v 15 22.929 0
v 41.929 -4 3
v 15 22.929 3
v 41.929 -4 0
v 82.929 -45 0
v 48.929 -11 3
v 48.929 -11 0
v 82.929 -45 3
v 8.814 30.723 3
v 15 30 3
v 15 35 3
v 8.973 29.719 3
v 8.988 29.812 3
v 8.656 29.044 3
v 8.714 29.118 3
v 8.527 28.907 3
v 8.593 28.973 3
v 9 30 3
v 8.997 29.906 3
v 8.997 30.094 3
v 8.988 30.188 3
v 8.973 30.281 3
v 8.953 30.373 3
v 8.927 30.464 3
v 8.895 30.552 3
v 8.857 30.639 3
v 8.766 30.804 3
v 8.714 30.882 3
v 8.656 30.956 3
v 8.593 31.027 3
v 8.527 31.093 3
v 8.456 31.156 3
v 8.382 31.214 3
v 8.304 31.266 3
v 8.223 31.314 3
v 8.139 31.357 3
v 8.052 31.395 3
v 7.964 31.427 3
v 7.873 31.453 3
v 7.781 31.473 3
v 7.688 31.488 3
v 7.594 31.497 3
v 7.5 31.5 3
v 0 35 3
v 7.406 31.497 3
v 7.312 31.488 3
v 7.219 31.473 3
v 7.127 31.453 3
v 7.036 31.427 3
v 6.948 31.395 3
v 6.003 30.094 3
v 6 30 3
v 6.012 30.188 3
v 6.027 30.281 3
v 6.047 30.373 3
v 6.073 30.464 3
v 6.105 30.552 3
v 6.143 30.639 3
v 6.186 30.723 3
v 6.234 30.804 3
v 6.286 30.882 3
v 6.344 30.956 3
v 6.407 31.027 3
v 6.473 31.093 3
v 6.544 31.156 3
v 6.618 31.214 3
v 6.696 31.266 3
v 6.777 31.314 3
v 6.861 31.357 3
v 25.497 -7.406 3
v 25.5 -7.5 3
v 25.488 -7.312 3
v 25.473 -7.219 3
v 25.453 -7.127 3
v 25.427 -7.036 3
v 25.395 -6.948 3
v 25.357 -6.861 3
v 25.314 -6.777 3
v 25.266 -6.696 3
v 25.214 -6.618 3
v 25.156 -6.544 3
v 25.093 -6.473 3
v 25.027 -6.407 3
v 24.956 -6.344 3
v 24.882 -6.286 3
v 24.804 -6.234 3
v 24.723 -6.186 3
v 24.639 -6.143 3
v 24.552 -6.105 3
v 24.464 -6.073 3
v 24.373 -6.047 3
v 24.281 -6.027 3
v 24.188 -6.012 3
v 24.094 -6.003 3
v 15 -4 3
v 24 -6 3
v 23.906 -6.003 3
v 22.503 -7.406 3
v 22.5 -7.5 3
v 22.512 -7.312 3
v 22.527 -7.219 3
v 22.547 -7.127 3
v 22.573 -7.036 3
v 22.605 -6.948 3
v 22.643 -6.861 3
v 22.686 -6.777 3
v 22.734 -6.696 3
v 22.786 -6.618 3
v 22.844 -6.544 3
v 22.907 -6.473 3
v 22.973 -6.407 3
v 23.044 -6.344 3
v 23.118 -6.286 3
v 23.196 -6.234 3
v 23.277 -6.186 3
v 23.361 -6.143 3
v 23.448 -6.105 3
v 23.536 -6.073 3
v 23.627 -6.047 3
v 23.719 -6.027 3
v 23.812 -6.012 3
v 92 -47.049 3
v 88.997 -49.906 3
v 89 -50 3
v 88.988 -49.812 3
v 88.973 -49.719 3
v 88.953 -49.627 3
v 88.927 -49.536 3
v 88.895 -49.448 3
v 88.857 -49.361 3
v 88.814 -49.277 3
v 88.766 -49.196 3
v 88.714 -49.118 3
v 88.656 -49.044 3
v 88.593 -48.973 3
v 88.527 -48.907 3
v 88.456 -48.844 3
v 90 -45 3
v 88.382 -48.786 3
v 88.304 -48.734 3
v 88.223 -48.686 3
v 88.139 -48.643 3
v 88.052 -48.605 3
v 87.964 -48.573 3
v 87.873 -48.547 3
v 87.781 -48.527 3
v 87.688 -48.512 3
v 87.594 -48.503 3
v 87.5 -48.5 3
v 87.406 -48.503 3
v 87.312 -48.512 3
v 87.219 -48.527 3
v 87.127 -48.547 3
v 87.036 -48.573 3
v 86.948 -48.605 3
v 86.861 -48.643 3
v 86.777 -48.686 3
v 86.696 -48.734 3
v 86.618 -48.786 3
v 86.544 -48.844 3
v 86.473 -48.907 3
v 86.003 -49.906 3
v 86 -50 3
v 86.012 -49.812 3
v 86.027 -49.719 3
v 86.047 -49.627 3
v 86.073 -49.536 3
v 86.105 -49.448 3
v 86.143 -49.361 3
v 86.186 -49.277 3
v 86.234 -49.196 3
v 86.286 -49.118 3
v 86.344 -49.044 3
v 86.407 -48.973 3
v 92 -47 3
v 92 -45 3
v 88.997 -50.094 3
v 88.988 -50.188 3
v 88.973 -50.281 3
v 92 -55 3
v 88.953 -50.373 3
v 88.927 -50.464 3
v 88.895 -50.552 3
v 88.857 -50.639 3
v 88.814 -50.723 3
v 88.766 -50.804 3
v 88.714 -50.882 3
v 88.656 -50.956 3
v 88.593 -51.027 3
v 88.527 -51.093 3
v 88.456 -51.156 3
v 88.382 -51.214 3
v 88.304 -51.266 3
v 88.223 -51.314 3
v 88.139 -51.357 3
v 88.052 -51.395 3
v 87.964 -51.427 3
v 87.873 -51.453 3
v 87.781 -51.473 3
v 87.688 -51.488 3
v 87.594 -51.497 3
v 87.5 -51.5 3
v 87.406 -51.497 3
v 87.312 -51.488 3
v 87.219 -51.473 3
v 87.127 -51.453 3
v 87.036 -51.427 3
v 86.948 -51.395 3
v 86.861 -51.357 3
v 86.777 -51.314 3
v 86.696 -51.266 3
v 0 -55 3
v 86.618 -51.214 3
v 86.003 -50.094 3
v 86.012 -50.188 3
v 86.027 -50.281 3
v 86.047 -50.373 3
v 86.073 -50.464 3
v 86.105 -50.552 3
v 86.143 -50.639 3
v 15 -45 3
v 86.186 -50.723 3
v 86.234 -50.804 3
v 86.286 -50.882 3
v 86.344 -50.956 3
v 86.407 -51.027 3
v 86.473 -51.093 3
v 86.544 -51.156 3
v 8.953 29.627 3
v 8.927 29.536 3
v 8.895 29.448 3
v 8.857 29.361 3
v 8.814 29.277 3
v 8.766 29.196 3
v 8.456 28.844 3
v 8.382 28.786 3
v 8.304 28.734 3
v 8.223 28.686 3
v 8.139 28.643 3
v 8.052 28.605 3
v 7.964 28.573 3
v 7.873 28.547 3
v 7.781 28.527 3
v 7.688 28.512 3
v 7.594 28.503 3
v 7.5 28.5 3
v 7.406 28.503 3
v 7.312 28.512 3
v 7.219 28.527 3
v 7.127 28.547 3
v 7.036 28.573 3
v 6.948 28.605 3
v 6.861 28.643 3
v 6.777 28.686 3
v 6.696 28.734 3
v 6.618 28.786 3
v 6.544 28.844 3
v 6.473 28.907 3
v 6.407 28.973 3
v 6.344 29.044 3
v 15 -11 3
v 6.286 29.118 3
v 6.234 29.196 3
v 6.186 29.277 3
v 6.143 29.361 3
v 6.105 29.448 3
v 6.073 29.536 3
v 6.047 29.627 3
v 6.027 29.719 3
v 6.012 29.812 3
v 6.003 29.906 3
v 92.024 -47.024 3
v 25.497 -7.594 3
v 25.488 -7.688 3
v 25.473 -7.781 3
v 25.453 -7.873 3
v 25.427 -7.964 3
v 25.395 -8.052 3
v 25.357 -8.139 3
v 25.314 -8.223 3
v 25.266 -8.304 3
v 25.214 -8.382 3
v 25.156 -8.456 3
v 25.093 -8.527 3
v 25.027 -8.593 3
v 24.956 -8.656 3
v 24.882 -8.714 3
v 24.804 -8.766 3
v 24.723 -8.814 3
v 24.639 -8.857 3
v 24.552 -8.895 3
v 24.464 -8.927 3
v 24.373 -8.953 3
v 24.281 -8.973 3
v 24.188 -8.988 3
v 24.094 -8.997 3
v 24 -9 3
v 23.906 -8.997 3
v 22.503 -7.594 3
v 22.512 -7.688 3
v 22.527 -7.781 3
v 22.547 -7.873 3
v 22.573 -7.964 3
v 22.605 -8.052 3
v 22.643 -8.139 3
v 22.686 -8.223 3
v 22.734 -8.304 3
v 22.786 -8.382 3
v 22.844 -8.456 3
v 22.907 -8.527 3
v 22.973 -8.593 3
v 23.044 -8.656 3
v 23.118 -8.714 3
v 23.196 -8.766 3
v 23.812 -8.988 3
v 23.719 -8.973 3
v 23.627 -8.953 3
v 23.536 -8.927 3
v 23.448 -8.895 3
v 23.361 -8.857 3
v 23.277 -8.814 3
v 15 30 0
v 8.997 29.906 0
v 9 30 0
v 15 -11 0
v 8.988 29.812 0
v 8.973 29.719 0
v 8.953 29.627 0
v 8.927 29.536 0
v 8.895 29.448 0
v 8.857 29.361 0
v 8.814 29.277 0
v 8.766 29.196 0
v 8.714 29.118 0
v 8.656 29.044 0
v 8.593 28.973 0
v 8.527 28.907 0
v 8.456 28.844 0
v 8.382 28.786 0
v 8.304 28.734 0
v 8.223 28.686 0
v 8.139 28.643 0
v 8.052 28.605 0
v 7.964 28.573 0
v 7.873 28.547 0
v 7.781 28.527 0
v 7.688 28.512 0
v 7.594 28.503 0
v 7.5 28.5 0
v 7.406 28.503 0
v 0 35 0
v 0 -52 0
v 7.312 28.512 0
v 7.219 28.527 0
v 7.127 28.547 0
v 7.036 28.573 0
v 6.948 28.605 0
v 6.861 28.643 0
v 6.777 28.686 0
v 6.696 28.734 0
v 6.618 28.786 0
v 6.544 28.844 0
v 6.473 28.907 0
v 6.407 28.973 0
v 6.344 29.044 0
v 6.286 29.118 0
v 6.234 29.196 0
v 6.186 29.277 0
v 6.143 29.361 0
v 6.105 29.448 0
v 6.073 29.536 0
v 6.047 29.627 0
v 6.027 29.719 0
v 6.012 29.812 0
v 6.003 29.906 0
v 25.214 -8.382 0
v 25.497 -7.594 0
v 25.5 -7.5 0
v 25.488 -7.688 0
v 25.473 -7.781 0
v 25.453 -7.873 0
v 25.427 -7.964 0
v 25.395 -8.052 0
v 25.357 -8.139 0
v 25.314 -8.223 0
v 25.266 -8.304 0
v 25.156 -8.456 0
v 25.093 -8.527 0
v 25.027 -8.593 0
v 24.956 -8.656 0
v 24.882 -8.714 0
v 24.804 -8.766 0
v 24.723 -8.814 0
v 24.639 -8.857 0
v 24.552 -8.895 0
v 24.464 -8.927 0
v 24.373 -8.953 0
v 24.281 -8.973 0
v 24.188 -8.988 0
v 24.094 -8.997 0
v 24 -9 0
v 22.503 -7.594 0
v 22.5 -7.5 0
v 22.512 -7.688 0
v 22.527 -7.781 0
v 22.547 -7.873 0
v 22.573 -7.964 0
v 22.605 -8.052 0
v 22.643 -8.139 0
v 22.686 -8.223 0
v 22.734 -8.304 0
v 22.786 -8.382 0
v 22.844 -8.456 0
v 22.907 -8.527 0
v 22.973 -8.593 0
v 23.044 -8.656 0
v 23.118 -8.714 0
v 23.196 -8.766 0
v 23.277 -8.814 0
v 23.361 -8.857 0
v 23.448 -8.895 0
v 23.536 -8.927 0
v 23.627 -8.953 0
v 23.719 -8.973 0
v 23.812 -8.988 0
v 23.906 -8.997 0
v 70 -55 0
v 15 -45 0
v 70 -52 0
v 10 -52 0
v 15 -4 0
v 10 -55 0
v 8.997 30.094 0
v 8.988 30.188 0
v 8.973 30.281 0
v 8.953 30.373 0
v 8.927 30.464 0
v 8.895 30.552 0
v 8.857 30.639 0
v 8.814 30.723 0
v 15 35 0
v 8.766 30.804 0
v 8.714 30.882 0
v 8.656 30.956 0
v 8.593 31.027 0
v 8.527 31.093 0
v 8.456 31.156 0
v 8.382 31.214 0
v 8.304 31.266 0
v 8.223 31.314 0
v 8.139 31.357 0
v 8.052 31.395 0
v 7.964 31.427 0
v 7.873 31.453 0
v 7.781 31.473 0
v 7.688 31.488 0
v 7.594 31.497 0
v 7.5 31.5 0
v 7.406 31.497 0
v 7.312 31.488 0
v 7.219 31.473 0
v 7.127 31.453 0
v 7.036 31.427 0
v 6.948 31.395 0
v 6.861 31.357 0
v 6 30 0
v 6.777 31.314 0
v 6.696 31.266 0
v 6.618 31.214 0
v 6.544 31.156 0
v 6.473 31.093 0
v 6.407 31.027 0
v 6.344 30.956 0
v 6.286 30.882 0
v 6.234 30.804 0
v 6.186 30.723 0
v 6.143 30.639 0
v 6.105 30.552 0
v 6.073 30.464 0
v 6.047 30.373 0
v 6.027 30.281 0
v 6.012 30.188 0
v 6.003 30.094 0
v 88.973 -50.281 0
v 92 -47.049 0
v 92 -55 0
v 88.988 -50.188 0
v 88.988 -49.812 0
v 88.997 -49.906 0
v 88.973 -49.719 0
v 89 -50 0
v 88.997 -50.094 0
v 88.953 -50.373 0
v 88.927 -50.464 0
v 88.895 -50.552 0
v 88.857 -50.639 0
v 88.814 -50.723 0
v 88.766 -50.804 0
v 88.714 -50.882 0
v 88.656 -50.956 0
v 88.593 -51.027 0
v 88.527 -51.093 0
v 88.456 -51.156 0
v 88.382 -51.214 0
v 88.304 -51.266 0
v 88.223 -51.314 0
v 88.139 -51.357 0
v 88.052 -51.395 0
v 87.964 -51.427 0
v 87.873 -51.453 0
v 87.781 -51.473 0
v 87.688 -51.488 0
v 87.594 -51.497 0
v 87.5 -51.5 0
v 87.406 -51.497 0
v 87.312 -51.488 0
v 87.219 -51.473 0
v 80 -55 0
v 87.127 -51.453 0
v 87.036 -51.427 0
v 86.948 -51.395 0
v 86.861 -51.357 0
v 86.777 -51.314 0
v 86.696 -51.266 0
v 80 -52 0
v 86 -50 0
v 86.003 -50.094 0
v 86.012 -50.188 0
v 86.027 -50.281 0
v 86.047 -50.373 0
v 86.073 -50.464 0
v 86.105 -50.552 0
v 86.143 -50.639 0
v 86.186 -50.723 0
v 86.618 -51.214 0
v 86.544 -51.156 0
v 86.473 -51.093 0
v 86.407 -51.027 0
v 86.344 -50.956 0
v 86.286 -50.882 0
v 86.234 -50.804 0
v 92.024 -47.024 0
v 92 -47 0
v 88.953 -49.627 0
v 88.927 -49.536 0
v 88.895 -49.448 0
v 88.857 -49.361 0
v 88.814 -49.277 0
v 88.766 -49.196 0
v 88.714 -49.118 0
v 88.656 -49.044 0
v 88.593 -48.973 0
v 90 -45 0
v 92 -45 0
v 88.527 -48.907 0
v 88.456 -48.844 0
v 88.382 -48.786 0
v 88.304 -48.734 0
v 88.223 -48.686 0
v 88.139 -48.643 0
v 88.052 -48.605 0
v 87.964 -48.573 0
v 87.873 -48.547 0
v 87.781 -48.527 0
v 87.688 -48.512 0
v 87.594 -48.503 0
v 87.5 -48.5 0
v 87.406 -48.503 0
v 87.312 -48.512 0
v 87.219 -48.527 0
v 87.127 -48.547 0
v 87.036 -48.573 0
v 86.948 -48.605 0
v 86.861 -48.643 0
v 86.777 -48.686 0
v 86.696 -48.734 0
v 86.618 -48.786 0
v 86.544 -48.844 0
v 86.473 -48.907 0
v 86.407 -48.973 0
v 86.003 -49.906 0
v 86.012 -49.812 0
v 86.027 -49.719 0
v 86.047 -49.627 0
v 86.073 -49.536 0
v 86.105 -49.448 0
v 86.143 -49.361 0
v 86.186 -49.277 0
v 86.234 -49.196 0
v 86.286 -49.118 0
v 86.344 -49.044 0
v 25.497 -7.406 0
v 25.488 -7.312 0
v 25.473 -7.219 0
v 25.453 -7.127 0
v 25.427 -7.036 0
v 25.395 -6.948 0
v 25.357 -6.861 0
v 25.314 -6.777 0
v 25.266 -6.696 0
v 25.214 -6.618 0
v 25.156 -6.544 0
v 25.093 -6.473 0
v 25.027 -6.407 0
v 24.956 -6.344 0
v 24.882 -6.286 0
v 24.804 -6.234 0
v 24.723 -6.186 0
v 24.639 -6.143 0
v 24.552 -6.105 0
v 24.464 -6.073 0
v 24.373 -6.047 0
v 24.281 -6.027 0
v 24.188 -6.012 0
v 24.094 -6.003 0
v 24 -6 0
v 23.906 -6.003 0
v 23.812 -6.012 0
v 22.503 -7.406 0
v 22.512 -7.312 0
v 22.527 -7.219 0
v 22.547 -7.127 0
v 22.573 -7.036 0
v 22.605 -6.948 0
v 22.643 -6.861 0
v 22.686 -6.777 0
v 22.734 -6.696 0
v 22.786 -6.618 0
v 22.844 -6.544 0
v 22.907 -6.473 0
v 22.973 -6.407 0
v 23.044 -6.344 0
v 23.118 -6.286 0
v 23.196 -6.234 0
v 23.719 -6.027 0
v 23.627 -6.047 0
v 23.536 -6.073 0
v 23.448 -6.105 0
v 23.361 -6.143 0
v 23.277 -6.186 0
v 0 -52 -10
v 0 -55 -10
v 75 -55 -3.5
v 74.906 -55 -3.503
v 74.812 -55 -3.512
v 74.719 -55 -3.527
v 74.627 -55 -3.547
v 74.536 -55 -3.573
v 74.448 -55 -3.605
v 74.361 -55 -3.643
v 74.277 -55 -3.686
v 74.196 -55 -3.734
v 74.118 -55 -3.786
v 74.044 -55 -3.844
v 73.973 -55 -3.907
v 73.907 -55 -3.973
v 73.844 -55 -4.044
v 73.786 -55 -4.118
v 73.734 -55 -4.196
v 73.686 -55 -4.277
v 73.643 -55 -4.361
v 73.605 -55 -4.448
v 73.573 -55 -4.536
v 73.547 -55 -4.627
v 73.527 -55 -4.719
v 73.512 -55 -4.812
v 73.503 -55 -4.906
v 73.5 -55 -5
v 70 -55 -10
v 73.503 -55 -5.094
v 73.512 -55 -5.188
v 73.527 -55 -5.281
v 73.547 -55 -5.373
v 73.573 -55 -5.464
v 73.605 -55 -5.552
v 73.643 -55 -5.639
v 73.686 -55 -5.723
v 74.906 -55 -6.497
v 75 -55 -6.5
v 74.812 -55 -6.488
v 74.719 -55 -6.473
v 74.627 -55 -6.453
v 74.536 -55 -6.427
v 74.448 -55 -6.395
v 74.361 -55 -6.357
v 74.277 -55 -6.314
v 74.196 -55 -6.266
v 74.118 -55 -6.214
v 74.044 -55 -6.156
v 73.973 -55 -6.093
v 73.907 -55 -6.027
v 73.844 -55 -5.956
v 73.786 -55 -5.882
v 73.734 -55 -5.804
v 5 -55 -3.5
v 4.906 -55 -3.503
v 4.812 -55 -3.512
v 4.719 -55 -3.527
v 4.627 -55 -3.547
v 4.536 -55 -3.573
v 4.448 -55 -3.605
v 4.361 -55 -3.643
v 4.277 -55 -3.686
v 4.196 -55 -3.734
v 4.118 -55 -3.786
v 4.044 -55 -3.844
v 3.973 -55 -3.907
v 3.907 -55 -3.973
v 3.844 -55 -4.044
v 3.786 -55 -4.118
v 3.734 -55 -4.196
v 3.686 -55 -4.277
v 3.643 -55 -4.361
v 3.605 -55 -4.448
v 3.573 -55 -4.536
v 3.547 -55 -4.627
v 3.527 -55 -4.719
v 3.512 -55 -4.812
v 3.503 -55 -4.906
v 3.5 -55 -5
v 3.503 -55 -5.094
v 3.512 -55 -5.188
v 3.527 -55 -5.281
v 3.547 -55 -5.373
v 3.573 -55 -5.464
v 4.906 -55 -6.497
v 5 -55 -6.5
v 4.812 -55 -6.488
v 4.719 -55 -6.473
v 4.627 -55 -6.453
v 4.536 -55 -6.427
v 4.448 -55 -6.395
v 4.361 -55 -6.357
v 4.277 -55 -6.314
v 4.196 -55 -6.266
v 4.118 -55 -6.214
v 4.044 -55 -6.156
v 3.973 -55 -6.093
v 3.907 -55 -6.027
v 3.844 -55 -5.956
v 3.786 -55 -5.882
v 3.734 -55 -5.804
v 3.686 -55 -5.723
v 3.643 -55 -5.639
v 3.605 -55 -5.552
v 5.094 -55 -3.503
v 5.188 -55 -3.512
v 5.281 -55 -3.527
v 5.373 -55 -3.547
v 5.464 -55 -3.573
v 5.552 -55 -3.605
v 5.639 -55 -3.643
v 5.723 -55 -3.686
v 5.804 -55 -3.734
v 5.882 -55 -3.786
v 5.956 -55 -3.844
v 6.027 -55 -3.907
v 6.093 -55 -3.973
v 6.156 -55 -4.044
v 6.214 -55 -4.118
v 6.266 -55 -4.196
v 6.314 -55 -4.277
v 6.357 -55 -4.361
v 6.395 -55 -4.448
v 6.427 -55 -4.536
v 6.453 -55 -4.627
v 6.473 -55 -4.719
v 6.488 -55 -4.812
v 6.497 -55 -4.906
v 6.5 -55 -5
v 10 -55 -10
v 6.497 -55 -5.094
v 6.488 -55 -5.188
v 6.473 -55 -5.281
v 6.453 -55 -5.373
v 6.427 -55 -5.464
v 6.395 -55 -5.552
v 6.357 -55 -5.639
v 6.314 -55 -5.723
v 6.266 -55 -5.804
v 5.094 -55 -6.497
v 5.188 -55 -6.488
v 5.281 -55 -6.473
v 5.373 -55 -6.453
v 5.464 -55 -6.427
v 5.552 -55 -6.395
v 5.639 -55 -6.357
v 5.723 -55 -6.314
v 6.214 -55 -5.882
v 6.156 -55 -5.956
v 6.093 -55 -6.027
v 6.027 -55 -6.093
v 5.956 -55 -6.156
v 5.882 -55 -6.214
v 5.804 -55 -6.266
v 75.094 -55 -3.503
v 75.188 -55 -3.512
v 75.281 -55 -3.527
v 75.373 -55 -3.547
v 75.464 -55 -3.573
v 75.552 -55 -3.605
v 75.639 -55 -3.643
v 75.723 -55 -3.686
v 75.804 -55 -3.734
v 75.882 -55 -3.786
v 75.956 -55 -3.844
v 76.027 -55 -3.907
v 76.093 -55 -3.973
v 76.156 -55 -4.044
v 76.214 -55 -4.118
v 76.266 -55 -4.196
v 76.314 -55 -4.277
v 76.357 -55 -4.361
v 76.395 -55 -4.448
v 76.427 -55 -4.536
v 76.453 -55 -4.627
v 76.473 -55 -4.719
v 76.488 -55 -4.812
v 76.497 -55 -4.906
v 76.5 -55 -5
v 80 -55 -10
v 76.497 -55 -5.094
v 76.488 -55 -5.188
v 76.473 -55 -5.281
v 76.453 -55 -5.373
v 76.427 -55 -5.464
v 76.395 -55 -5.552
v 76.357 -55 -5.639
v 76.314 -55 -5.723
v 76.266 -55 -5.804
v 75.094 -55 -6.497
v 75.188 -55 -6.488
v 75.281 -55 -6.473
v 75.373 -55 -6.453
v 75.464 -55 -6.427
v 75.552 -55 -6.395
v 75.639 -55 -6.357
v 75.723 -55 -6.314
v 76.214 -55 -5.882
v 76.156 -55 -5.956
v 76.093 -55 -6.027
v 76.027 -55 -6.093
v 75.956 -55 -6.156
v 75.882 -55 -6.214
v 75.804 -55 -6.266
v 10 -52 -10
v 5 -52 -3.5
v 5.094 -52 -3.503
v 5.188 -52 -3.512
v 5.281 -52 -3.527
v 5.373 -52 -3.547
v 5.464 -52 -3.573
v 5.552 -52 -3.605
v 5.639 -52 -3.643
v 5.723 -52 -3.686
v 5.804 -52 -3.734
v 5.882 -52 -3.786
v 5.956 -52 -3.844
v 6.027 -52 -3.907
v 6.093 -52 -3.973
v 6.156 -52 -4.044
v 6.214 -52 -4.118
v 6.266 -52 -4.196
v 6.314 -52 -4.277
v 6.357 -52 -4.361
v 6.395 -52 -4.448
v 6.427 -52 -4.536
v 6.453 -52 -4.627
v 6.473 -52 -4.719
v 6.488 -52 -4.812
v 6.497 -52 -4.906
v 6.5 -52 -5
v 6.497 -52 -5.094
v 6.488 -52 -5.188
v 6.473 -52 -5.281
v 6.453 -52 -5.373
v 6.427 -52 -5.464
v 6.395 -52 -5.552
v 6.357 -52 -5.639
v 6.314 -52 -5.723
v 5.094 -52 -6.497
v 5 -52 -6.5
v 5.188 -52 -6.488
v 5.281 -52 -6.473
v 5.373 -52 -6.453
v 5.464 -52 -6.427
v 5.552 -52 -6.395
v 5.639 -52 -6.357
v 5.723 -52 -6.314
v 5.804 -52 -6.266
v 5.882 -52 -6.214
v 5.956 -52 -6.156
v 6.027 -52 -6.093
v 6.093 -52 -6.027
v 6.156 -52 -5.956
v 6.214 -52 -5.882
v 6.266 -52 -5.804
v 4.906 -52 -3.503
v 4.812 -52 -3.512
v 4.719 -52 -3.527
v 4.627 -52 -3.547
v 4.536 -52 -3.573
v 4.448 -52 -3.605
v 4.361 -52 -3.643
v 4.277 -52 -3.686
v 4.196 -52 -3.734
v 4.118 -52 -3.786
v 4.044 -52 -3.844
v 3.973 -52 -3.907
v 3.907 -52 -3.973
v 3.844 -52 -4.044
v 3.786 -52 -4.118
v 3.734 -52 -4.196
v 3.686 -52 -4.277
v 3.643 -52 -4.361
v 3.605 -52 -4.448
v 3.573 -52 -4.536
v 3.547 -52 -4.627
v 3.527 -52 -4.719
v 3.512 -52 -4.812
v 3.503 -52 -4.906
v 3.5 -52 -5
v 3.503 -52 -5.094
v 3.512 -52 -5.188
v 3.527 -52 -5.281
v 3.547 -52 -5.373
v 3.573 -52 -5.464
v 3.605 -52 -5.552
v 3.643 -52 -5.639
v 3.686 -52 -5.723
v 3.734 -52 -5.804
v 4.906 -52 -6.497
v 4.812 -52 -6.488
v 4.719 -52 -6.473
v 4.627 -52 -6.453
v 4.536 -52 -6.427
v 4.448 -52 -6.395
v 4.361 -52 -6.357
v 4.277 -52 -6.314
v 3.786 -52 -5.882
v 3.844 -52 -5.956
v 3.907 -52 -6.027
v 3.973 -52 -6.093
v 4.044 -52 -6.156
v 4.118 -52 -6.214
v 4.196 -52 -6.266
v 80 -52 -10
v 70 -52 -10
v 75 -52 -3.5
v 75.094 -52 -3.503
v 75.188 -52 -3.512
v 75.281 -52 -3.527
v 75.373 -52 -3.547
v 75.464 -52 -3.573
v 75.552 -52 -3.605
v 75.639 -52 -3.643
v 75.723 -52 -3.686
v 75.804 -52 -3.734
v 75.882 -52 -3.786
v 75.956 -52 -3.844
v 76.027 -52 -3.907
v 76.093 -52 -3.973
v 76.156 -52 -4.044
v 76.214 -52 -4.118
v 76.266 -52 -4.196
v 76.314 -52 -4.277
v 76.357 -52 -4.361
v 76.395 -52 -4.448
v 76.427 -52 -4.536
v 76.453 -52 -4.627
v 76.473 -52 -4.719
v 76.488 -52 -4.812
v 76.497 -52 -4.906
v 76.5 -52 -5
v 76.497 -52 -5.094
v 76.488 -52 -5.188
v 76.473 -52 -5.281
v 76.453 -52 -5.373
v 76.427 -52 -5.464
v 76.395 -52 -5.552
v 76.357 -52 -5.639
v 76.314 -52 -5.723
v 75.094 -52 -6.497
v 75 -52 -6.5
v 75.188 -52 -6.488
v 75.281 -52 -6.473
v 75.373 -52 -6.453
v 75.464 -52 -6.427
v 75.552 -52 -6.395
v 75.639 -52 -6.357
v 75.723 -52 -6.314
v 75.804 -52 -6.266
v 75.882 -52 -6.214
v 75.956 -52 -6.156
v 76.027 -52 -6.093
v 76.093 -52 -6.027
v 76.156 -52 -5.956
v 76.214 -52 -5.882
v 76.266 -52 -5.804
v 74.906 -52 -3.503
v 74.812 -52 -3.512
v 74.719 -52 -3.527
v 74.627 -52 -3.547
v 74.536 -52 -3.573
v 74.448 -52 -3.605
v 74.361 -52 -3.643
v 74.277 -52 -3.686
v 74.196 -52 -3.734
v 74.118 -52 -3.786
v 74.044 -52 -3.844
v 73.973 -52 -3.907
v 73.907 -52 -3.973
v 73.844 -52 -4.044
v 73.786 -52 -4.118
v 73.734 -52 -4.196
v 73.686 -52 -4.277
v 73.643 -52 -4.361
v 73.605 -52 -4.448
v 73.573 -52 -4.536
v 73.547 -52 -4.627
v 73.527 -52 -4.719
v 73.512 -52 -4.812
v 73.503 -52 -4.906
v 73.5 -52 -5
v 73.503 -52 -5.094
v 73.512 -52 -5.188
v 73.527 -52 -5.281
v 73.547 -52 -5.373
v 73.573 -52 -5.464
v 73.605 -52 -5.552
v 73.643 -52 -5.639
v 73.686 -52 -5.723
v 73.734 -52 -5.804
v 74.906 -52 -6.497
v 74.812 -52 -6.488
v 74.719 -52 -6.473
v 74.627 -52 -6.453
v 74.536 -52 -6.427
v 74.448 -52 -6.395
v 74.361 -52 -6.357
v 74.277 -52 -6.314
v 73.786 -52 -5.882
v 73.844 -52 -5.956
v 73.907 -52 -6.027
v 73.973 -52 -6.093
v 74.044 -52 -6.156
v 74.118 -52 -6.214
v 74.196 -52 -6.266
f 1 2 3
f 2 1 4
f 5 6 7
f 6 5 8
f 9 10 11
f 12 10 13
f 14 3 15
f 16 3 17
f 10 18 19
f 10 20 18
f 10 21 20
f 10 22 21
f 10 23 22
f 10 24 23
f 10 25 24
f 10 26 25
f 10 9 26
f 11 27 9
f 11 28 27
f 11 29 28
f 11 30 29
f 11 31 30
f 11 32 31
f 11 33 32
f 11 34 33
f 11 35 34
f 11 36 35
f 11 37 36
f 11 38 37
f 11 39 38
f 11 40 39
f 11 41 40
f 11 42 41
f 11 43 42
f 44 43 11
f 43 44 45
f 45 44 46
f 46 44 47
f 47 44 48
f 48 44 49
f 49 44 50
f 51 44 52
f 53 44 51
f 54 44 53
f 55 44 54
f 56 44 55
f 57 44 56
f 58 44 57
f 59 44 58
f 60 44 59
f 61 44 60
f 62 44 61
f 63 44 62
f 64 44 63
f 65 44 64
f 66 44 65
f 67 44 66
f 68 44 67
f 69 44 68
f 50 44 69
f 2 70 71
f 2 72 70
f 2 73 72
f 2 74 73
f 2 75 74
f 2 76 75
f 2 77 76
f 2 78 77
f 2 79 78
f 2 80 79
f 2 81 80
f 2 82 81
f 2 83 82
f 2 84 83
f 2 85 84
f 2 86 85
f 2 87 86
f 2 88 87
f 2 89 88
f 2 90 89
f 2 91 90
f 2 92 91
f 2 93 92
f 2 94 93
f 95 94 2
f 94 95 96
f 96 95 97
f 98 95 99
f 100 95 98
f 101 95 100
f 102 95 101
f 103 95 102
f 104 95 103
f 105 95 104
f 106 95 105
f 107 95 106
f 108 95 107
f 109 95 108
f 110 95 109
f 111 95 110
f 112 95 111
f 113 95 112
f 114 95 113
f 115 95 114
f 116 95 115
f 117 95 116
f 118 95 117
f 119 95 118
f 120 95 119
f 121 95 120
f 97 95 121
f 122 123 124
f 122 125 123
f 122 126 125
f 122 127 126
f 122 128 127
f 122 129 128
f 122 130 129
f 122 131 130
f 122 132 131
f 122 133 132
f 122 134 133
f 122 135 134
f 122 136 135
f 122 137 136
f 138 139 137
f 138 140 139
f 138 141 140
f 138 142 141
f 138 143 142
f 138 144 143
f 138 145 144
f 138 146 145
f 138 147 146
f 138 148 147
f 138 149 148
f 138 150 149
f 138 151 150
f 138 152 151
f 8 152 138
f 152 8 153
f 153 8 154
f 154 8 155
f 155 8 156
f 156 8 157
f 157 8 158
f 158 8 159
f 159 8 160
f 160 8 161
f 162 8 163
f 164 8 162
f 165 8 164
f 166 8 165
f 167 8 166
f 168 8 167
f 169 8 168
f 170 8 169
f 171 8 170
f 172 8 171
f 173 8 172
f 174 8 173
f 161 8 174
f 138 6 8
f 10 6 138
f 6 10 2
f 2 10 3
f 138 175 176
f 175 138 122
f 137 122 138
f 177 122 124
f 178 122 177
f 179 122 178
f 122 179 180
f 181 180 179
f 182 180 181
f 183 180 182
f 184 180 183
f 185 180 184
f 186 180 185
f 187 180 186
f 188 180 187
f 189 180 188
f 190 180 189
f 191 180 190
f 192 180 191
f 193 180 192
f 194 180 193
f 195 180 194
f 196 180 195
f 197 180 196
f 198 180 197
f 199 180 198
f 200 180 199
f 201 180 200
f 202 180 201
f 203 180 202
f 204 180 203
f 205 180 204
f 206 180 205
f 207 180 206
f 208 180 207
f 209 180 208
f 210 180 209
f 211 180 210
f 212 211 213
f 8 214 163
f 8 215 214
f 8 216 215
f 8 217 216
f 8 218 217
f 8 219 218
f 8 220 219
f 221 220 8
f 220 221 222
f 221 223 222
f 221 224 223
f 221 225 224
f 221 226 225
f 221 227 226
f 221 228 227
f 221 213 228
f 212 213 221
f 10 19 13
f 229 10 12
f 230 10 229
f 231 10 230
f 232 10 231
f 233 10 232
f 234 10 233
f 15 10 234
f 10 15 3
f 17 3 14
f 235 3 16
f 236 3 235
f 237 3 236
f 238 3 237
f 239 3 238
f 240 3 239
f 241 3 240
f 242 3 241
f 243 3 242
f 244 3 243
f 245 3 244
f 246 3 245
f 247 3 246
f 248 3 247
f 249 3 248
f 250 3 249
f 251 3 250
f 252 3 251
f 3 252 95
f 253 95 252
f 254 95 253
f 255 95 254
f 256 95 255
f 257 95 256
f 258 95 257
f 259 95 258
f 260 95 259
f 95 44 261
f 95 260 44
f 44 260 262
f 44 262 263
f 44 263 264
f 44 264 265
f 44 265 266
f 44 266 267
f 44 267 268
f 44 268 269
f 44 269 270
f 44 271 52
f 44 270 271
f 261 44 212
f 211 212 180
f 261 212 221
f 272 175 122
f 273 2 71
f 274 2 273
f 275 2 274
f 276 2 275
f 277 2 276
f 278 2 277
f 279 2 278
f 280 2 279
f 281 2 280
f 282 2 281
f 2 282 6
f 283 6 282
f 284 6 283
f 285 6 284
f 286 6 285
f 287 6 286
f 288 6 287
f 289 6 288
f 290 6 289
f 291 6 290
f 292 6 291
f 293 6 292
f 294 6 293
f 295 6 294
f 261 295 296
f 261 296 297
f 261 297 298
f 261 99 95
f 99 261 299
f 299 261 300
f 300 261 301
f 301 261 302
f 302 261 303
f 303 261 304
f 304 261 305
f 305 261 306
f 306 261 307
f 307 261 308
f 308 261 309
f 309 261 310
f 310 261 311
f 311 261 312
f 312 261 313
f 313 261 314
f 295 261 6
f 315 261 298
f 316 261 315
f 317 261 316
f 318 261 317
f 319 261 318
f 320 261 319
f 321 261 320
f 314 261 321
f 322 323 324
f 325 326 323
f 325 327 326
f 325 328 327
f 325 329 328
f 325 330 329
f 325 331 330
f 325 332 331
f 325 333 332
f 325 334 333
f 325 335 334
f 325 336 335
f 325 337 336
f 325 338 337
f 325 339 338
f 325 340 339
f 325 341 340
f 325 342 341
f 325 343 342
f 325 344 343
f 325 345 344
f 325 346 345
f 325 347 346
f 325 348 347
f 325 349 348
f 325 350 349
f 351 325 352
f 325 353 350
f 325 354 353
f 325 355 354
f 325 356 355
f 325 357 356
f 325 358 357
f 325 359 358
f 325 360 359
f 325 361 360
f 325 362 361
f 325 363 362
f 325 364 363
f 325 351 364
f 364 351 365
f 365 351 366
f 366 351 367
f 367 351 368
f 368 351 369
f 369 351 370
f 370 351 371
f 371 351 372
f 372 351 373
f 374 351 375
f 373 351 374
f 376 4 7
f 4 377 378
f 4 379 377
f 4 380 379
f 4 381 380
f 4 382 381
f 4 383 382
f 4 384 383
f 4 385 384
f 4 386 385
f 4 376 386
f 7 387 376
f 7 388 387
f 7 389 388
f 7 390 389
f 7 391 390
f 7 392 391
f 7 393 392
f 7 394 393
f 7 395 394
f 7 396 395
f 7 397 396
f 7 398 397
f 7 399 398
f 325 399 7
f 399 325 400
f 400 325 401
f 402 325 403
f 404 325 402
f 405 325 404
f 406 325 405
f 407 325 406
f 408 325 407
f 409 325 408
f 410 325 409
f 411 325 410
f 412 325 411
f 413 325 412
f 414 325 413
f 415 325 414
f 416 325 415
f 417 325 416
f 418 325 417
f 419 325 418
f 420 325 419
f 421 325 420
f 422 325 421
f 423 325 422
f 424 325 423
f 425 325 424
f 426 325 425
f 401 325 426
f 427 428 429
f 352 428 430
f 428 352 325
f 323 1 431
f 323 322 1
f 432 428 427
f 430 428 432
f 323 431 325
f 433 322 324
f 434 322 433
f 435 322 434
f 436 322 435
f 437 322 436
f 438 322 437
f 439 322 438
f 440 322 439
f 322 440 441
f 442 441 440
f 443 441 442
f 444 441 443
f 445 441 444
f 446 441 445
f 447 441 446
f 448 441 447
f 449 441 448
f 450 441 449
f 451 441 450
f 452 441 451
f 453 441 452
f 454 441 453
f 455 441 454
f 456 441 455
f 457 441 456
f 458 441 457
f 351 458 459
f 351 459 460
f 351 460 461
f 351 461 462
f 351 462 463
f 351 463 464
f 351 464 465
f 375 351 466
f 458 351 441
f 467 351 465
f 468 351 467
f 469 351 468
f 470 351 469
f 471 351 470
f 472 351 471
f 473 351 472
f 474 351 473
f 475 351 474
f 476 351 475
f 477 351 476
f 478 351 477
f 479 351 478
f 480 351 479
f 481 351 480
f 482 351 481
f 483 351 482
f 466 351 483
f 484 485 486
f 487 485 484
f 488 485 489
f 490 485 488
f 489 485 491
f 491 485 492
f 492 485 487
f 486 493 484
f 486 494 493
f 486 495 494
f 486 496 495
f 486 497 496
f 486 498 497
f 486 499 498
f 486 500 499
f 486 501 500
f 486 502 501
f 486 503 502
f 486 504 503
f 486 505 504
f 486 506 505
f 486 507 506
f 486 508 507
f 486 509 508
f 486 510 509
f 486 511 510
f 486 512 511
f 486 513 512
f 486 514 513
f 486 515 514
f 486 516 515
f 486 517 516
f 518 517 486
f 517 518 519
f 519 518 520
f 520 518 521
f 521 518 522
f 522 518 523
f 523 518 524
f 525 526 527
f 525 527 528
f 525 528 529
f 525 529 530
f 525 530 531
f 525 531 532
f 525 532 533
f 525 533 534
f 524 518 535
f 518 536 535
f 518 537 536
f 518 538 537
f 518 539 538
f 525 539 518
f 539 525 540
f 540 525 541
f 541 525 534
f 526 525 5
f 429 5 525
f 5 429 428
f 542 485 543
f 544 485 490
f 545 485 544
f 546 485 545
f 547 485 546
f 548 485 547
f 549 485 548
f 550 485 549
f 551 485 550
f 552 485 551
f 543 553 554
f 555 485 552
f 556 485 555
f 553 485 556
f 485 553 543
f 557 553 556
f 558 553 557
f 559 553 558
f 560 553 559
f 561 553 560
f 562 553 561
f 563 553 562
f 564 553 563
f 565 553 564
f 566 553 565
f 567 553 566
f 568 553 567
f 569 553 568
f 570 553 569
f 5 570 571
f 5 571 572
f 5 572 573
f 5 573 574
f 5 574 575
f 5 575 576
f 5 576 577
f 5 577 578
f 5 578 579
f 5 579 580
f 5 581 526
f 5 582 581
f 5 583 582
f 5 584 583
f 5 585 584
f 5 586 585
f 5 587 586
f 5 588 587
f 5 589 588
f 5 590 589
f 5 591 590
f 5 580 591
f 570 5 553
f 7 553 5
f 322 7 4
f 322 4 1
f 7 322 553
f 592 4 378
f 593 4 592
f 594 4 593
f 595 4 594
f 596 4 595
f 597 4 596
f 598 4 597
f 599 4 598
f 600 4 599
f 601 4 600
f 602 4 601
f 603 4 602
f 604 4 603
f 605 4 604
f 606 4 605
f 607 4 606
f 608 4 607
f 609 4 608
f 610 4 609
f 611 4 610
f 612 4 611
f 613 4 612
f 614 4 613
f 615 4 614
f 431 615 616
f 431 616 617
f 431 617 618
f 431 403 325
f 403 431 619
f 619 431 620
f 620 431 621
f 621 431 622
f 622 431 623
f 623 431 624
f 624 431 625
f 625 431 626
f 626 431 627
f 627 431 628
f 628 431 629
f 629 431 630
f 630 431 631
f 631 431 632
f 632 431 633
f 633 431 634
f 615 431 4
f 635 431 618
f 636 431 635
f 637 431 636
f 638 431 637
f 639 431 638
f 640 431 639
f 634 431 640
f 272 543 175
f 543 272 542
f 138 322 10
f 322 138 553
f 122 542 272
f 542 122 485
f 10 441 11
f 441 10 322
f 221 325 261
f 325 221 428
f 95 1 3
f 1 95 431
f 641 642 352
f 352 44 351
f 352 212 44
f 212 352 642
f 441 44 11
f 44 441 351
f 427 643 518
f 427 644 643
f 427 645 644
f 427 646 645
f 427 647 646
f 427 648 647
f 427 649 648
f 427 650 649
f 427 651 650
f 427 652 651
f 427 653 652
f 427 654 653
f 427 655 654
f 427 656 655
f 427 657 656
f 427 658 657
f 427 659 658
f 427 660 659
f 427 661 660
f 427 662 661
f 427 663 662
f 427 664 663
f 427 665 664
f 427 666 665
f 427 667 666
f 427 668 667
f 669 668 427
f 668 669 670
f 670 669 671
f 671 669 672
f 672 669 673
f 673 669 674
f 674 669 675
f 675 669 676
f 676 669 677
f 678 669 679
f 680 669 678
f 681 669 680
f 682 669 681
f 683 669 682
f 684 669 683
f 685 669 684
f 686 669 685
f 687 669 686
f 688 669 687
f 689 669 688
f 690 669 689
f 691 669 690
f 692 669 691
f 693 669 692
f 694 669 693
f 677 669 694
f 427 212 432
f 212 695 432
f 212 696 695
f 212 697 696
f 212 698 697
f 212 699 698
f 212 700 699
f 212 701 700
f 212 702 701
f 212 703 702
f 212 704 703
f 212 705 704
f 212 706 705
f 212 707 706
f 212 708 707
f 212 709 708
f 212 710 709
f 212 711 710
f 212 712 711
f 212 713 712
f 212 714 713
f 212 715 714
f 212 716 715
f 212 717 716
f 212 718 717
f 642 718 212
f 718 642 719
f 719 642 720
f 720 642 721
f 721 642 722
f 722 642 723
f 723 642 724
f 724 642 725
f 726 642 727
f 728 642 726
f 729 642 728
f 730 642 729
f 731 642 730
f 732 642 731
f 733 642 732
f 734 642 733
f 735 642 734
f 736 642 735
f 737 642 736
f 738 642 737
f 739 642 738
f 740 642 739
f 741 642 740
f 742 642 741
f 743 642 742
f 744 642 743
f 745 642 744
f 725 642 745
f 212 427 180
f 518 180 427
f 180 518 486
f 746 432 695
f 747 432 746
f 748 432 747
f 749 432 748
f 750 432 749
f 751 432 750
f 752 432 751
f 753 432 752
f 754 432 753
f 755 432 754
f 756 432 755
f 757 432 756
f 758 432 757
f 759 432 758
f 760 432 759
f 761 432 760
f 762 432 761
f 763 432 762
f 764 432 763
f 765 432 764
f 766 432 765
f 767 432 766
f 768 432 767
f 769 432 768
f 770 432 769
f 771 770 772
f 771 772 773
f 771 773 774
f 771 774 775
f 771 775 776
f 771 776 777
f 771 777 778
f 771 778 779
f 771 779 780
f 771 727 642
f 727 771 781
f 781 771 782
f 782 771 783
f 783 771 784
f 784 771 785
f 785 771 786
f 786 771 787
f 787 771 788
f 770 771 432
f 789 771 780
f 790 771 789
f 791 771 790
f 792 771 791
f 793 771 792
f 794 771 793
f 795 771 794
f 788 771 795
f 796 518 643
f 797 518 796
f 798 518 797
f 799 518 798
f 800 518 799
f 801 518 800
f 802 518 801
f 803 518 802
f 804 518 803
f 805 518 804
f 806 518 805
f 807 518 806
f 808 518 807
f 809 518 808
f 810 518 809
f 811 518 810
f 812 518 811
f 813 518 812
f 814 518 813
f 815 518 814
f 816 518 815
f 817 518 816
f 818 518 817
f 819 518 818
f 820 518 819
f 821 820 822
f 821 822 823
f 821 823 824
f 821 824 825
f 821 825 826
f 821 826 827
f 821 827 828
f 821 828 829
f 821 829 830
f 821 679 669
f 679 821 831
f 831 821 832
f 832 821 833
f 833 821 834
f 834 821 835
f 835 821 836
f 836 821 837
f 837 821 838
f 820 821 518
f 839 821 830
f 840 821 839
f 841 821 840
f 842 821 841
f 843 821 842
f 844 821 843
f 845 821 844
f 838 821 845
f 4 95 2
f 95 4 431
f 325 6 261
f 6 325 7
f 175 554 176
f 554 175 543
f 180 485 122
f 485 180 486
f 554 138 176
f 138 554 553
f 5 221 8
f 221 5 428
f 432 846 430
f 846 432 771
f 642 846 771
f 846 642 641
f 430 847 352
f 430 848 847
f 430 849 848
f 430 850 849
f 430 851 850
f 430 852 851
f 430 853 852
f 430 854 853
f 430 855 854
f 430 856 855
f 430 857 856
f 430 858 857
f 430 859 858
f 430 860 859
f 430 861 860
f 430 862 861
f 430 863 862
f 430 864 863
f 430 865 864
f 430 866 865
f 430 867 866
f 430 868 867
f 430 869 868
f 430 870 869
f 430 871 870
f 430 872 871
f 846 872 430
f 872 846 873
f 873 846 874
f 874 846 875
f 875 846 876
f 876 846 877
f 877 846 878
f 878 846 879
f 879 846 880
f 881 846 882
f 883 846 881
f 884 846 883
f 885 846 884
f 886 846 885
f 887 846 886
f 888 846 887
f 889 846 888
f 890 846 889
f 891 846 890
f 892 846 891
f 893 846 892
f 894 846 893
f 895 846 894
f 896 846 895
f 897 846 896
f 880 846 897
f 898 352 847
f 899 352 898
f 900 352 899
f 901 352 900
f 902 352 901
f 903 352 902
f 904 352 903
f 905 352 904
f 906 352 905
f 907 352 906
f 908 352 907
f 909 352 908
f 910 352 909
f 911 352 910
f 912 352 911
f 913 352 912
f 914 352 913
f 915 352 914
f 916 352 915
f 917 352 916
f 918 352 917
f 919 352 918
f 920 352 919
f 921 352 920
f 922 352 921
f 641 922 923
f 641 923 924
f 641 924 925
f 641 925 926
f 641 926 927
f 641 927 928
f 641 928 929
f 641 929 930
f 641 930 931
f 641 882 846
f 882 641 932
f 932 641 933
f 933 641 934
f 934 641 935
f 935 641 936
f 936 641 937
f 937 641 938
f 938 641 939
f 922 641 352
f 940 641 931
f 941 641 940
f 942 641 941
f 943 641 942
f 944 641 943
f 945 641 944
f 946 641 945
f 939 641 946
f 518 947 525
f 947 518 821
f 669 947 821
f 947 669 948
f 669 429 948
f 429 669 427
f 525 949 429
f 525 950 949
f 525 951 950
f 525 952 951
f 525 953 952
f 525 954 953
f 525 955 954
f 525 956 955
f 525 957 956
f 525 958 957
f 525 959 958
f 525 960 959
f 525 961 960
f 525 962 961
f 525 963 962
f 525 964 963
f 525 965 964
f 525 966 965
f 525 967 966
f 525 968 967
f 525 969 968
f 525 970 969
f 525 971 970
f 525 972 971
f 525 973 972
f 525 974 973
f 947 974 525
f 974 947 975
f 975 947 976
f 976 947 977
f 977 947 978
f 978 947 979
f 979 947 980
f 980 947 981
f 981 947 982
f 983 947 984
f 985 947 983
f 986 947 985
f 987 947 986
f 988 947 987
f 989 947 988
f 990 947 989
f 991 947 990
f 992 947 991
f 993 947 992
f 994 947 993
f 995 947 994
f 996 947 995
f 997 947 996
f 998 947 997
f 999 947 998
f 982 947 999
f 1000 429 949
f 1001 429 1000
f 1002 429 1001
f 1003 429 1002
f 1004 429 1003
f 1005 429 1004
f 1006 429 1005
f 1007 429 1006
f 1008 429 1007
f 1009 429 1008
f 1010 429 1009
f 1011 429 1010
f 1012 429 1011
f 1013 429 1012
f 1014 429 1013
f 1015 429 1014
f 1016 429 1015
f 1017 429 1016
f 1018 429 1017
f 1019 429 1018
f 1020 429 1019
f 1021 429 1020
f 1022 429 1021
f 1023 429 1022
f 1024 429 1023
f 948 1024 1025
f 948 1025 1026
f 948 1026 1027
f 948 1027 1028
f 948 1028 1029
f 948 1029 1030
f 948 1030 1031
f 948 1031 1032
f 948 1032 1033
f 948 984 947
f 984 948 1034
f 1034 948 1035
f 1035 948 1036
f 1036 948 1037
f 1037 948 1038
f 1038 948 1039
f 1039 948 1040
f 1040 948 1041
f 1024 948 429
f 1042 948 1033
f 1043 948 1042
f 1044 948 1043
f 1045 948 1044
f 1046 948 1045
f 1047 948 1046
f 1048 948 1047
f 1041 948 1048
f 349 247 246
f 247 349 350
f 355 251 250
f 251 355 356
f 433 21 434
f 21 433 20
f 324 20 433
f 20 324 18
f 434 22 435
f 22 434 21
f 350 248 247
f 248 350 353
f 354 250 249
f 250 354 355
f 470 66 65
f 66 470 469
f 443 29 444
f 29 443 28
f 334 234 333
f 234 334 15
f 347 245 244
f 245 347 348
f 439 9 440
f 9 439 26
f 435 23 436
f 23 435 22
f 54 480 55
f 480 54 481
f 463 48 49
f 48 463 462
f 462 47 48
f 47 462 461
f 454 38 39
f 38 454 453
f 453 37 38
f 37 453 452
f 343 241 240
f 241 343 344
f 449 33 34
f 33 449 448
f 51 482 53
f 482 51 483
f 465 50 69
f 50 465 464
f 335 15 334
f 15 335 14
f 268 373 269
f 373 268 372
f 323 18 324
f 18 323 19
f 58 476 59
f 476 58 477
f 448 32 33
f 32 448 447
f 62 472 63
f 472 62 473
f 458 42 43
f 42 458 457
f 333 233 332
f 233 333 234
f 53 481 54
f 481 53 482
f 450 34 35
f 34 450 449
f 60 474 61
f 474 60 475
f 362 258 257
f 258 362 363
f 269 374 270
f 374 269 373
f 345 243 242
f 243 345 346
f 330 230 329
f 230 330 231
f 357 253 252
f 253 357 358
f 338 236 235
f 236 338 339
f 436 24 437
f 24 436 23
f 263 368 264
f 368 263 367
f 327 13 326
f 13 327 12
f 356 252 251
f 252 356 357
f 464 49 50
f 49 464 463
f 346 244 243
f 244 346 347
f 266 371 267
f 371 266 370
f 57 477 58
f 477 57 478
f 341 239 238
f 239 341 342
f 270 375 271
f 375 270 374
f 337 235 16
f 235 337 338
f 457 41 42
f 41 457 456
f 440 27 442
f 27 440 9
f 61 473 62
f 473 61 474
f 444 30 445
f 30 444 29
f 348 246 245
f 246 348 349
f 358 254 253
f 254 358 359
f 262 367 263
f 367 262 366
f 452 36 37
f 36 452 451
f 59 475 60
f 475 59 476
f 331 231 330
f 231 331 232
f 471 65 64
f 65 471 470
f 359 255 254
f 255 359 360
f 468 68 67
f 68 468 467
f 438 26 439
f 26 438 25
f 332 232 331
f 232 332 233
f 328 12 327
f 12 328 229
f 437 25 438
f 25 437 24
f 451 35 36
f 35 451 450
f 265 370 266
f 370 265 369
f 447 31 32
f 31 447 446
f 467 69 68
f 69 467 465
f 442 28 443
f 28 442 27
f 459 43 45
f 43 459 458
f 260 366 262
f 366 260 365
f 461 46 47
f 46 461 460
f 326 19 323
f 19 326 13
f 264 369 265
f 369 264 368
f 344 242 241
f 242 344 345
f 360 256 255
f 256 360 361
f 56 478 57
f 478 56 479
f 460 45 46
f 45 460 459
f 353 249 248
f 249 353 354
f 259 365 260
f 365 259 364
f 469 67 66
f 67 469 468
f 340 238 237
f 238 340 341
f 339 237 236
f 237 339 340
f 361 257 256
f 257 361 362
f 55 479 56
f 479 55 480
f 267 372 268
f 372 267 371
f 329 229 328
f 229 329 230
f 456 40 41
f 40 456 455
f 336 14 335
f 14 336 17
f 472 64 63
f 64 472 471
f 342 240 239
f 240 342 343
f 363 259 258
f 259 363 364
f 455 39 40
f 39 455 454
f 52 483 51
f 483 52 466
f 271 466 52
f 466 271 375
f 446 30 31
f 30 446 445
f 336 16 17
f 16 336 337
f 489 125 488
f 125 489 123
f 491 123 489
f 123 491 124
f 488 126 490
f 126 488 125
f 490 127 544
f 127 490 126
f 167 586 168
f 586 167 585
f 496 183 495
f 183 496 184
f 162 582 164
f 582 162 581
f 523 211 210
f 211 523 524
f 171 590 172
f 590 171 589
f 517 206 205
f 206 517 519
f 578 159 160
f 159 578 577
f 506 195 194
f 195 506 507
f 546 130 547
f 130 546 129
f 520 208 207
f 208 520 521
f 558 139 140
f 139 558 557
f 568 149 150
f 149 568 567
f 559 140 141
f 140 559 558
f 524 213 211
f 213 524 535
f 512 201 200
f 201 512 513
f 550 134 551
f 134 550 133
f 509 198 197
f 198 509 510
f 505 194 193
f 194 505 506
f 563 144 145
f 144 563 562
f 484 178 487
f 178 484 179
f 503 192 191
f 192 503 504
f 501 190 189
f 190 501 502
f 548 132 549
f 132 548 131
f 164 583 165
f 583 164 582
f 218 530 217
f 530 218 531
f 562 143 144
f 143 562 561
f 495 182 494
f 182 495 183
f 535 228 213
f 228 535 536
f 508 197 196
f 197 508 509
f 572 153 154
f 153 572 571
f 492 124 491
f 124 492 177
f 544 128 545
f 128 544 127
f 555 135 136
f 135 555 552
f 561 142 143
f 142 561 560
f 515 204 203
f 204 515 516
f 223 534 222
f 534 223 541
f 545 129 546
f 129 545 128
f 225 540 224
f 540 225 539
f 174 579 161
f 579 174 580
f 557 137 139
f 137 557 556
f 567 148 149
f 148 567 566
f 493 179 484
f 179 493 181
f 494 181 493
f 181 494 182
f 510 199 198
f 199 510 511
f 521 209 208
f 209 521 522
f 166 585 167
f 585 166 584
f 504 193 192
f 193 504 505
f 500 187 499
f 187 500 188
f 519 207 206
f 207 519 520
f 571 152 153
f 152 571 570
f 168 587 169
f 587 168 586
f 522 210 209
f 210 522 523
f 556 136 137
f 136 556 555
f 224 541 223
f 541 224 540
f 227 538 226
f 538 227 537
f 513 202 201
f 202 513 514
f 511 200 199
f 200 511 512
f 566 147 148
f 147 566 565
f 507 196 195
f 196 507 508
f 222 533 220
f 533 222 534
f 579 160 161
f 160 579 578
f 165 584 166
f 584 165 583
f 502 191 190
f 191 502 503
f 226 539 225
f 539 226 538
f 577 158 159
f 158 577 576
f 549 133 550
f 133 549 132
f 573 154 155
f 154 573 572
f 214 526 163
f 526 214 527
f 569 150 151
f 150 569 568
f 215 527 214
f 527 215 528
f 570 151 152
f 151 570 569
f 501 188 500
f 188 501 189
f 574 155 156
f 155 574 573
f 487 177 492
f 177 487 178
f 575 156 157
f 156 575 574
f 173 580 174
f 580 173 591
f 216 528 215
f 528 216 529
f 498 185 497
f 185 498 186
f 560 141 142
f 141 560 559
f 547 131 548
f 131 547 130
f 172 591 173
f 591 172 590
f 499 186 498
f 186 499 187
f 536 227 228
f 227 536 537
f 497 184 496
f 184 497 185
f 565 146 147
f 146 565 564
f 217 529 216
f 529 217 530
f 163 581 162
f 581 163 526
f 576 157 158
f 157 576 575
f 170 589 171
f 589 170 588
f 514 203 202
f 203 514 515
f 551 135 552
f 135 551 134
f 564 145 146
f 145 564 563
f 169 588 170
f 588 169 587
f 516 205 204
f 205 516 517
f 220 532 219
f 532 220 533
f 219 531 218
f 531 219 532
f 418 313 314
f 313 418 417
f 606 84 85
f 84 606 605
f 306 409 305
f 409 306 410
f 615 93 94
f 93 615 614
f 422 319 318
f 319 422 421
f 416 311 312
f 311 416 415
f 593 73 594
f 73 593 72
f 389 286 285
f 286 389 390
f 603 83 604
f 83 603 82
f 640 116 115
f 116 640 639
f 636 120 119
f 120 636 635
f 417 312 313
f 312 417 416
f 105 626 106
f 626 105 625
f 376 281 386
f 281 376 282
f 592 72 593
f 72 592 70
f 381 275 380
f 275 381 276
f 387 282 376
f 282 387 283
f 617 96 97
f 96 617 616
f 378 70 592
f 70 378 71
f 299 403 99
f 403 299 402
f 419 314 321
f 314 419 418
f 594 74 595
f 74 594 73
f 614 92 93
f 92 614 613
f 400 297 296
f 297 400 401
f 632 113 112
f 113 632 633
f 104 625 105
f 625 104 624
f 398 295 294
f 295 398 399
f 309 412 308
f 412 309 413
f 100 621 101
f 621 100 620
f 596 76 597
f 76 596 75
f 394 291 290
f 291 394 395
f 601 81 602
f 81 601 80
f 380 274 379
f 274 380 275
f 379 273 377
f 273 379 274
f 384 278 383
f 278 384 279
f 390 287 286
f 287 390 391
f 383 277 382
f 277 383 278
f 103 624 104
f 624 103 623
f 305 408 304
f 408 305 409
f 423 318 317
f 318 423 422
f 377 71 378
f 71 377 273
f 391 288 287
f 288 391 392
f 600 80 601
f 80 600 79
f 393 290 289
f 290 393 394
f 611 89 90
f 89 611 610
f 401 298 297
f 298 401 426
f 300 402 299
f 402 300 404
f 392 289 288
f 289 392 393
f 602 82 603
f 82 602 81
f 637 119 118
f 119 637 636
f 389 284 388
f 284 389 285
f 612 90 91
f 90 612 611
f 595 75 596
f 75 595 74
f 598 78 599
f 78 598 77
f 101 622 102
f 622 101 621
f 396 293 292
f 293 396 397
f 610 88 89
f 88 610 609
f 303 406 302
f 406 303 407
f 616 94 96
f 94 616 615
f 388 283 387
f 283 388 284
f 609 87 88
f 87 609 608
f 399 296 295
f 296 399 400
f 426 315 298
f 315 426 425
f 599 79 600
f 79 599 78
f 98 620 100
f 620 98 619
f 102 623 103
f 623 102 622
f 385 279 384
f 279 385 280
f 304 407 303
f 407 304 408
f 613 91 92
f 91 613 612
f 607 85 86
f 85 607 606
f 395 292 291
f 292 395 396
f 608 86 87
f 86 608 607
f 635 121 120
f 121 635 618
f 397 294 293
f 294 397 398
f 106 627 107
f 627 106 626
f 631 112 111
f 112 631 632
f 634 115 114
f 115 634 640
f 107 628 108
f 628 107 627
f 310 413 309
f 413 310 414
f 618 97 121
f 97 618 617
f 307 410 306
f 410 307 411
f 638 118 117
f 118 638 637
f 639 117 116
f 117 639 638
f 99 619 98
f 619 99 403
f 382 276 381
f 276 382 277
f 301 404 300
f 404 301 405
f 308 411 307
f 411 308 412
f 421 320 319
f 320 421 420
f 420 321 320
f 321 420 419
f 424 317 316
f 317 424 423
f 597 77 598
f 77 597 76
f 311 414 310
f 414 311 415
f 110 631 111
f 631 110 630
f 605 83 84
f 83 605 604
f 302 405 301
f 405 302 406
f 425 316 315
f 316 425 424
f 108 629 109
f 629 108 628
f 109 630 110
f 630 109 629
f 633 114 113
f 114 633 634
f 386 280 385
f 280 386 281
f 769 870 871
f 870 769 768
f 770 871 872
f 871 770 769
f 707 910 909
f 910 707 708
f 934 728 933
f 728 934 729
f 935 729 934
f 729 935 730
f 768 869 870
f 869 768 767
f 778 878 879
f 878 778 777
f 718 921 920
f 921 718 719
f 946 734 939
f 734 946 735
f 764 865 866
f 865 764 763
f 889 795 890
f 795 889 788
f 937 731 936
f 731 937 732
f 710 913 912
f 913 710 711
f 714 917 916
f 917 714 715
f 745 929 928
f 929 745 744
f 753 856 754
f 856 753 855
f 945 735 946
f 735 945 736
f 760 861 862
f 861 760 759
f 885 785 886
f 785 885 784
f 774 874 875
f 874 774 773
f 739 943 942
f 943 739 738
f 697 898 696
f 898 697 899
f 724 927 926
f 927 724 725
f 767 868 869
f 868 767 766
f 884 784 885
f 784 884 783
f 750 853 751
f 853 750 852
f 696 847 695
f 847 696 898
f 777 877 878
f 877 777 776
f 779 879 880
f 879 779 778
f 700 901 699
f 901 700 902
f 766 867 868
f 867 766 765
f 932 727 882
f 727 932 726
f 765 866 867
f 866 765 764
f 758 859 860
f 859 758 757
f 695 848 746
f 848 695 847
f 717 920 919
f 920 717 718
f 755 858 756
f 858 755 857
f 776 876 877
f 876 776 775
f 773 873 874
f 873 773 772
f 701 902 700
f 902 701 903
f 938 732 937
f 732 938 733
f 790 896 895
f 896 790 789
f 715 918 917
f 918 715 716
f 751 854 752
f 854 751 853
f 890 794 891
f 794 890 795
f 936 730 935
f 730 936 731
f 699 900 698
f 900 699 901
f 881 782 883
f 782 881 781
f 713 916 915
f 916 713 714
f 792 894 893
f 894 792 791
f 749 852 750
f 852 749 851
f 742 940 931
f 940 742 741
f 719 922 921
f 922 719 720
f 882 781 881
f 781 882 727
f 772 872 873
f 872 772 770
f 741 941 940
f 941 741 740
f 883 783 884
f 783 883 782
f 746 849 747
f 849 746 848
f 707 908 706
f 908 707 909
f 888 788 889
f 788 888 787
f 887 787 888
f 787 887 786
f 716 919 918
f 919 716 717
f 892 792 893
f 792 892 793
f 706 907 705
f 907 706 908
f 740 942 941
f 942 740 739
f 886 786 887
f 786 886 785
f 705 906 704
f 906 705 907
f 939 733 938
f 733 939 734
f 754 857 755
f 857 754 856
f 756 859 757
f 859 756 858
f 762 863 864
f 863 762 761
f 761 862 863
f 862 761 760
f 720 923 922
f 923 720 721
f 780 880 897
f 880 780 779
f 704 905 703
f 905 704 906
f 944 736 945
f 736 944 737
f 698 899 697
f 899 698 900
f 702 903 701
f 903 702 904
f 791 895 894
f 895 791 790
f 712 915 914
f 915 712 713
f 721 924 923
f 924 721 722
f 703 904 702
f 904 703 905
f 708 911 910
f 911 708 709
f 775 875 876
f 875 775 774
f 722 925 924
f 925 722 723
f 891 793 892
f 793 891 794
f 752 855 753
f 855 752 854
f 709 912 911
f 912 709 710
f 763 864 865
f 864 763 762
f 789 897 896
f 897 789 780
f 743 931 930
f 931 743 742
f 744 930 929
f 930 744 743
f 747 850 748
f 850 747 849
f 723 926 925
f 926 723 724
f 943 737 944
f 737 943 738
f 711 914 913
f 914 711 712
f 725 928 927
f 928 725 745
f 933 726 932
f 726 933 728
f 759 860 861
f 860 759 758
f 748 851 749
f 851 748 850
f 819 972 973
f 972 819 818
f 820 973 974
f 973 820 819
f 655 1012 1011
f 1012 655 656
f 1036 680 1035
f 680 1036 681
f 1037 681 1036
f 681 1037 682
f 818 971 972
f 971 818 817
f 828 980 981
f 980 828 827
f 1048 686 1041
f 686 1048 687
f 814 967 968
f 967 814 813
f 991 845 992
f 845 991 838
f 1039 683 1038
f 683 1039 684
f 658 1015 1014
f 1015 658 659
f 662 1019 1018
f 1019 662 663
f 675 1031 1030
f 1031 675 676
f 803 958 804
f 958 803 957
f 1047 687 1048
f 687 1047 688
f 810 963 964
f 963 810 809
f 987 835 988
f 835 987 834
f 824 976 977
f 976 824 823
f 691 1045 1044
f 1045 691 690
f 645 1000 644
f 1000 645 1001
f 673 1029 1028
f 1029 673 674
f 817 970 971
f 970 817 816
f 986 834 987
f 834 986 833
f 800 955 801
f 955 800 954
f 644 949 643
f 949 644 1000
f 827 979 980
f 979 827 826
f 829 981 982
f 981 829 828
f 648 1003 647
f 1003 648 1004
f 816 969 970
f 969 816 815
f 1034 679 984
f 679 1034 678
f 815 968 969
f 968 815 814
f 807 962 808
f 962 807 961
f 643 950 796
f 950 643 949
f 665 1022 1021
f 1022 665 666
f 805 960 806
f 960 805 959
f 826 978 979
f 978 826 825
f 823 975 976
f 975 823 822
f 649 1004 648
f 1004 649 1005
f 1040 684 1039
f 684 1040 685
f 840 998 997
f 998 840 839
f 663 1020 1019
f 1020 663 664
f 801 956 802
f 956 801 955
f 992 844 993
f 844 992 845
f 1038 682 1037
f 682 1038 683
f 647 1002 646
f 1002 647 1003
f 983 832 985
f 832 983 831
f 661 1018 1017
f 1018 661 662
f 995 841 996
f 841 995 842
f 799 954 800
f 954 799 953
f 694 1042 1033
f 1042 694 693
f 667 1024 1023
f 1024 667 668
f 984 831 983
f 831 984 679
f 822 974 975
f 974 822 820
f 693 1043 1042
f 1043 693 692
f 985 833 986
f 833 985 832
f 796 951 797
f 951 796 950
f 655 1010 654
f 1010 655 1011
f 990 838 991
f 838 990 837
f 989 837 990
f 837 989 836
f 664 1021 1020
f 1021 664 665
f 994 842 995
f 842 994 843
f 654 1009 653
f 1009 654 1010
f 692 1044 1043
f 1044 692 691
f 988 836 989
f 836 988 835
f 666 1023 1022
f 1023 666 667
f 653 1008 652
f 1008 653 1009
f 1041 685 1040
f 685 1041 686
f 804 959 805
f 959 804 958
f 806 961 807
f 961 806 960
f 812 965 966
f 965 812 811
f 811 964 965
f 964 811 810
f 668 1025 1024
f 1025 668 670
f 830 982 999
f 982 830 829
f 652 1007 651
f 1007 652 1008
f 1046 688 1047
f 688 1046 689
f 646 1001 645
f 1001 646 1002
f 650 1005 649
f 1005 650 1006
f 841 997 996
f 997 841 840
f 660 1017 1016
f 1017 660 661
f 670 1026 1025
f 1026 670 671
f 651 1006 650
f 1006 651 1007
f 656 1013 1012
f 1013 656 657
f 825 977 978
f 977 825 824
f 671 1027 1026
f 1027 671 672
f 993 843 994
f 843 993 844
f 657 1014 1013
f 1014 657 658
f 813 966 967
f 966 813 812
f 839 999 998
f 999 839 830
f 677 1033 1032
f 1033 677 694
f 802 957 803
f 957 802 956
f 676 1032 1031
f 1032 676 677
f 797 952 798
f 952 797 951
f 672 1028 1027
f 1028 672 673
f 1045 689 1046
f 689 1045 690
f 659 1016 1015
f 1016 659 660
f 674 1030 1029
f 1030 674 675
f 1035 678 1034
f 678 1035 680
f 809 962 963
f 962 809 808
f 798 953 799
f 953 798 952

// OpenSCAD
      
dikte = 3;

difference(){
	union(){   
       
        translate([10,35,0]){
           rotate(a = [0,0,-135]) {
             cube([5,116,dikte], center=false);
           }
        }

        translate([0,-55,0]){
           cube([15,90,dikte], center=false);
        }
     
        translate([0,-11,0]){
           cube([49,7,dikte], center=false);
        }
        translate([0,-55,0]){
           cube([92,10,dikte], center=false);
        }
        translate([0,-55,-10]){
           cube([10,3,13], center=false);
        }
        translate([70,-55,-10]){
           cube([10,3,13], center=false);
        }


        
	}
	union() {

/* gaten in as */
        translate([7.5,30,-10]){
            rotate(a = [0,0,0]) {
                cylinder(h=400, r=1.5, $fn=100, center=false);
            }
        }	
        translate([87.5,-50,-10]){
            rotate(a = [0,0,0]) {
                cylinder(h=400, r=1.5, $fn=100, center=false);
            }
        }	
        translate([24,-7.5,-10]){
            rotate(a = [0,0,0]) {
                cylinder(h=400, r=1.5, $fn=100, center=false);
            }
        }	
        translate([5,30,-5]){
            rotate(a = [90,0,0]) {
                cylinder(h=400, r=1.5, $fn=100, center=false);
            }
        }	
        translate([75,30,-5]){
            rotate(a = [90,0,0]) {
                cylinder(h=400, r=1.5, $fn=100, center=false);
            }
        }	
        
	}
}
